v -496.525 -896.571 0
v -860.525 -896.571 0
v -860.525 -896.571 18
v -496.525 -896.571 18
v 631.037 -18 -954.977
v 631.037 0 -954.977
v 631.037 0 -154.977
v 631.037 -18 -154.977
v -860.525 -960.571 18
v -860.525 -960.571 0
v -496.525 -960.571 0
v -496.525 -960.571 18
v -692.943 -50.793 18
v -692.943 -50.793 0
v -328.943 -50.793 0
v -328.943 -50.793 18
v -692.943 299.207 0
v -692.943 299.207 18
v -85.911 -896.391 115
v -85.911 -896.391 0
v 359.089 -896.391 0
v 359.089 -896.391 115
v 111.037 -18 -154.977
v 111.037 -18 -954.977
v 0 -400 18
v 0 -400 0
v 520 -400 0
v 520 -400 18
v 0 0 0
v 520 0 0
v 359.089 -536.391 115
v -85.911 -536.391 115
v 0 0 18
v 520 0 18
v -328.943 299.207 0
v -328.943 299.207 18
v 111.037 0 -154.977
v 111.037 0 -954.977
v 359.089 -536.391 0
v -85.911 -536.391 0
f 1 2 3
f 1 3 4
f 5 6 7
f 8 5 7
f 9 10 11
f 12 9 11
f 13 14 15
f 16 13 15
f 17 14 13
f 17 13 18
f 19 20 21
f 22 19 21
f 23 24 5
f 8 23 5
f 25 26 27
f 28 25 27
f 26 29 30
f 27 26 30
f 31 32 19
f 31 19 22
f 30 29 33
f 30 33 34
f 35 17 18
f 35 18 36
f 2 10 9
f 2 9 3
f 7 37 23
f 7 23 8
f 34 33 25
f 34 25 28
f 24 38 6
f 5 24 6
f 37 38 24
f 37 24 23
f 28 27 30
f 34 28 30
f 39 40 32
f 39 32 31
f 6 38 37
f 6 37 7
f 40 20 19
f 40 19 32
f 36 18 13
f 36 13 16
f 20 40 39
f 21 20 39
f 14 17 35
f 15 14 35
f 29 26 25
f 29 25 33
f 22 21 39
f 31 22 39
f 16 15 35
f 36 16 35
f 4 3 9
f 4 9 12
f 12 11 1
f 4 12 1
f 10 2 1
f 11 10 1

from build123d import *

# Parameters (mm, degrees)
F0_W     = 520
F0_H     = 400
F1_DEPTH = 18
F2_W     = 520
F2_H     = 800
F3_DEPTH = 18
F4_W     = 364
F4_H     = 350
F5_DEPTH = 18
F6_W     = 364
F6_H     = 64
F7_DEPTH = 18
F8_W     = 445
F8_H     = 360
F9_DEPTH = 115


with BuildPart() as f1:
    # F0 (on Top) → F1 (new body)
    with BuildSketch(Plane.XY):
        with Locations((260, -200)):
            Rectangle(F0_W, F0_H)
    extrude(amount=F1_DEPTH)


with BuildPart() as f3:
    # F2 (on Front) → F3 (new body)
    with BuildSketch(Plane.XZ):
        with Locations((371.036677, -554.97741)):
            Rectangle(F2_W, F2_H)
    extrude(amount=F3_DEPTH)


with BuildPart() as f5:
    # F4 (on Top) → F5 (new body)
    with BuildSketch(Plane.XY):
        with Locations((-510.943099, 124.207413)):
            Rectangle(F4_W, F4_H)
    extrude(amount=F5_DEPTH)


with BuildPart() as f7:
    # F6 (on Top) → F7 (new body)
    with BuildSketch(Plane.XY):
        with Locations((-678.525298, -928.570789)):
            Rectangle(F6_W, F6_H)
    extrude(amount=F7_DEPTH)


with BuildPart() as f9:
    # F8 (on Top) → F9 (new body)
    with BuildSketch(Plane.XY):
        with Locations((136.589084, -716.390855)):
            Rectangle(F8_W, F8_H)
    extrude(amount=F9_DEPTH)


solid = Compound([f1.part, f3.part, f5.part, f7.part, f9.part])
